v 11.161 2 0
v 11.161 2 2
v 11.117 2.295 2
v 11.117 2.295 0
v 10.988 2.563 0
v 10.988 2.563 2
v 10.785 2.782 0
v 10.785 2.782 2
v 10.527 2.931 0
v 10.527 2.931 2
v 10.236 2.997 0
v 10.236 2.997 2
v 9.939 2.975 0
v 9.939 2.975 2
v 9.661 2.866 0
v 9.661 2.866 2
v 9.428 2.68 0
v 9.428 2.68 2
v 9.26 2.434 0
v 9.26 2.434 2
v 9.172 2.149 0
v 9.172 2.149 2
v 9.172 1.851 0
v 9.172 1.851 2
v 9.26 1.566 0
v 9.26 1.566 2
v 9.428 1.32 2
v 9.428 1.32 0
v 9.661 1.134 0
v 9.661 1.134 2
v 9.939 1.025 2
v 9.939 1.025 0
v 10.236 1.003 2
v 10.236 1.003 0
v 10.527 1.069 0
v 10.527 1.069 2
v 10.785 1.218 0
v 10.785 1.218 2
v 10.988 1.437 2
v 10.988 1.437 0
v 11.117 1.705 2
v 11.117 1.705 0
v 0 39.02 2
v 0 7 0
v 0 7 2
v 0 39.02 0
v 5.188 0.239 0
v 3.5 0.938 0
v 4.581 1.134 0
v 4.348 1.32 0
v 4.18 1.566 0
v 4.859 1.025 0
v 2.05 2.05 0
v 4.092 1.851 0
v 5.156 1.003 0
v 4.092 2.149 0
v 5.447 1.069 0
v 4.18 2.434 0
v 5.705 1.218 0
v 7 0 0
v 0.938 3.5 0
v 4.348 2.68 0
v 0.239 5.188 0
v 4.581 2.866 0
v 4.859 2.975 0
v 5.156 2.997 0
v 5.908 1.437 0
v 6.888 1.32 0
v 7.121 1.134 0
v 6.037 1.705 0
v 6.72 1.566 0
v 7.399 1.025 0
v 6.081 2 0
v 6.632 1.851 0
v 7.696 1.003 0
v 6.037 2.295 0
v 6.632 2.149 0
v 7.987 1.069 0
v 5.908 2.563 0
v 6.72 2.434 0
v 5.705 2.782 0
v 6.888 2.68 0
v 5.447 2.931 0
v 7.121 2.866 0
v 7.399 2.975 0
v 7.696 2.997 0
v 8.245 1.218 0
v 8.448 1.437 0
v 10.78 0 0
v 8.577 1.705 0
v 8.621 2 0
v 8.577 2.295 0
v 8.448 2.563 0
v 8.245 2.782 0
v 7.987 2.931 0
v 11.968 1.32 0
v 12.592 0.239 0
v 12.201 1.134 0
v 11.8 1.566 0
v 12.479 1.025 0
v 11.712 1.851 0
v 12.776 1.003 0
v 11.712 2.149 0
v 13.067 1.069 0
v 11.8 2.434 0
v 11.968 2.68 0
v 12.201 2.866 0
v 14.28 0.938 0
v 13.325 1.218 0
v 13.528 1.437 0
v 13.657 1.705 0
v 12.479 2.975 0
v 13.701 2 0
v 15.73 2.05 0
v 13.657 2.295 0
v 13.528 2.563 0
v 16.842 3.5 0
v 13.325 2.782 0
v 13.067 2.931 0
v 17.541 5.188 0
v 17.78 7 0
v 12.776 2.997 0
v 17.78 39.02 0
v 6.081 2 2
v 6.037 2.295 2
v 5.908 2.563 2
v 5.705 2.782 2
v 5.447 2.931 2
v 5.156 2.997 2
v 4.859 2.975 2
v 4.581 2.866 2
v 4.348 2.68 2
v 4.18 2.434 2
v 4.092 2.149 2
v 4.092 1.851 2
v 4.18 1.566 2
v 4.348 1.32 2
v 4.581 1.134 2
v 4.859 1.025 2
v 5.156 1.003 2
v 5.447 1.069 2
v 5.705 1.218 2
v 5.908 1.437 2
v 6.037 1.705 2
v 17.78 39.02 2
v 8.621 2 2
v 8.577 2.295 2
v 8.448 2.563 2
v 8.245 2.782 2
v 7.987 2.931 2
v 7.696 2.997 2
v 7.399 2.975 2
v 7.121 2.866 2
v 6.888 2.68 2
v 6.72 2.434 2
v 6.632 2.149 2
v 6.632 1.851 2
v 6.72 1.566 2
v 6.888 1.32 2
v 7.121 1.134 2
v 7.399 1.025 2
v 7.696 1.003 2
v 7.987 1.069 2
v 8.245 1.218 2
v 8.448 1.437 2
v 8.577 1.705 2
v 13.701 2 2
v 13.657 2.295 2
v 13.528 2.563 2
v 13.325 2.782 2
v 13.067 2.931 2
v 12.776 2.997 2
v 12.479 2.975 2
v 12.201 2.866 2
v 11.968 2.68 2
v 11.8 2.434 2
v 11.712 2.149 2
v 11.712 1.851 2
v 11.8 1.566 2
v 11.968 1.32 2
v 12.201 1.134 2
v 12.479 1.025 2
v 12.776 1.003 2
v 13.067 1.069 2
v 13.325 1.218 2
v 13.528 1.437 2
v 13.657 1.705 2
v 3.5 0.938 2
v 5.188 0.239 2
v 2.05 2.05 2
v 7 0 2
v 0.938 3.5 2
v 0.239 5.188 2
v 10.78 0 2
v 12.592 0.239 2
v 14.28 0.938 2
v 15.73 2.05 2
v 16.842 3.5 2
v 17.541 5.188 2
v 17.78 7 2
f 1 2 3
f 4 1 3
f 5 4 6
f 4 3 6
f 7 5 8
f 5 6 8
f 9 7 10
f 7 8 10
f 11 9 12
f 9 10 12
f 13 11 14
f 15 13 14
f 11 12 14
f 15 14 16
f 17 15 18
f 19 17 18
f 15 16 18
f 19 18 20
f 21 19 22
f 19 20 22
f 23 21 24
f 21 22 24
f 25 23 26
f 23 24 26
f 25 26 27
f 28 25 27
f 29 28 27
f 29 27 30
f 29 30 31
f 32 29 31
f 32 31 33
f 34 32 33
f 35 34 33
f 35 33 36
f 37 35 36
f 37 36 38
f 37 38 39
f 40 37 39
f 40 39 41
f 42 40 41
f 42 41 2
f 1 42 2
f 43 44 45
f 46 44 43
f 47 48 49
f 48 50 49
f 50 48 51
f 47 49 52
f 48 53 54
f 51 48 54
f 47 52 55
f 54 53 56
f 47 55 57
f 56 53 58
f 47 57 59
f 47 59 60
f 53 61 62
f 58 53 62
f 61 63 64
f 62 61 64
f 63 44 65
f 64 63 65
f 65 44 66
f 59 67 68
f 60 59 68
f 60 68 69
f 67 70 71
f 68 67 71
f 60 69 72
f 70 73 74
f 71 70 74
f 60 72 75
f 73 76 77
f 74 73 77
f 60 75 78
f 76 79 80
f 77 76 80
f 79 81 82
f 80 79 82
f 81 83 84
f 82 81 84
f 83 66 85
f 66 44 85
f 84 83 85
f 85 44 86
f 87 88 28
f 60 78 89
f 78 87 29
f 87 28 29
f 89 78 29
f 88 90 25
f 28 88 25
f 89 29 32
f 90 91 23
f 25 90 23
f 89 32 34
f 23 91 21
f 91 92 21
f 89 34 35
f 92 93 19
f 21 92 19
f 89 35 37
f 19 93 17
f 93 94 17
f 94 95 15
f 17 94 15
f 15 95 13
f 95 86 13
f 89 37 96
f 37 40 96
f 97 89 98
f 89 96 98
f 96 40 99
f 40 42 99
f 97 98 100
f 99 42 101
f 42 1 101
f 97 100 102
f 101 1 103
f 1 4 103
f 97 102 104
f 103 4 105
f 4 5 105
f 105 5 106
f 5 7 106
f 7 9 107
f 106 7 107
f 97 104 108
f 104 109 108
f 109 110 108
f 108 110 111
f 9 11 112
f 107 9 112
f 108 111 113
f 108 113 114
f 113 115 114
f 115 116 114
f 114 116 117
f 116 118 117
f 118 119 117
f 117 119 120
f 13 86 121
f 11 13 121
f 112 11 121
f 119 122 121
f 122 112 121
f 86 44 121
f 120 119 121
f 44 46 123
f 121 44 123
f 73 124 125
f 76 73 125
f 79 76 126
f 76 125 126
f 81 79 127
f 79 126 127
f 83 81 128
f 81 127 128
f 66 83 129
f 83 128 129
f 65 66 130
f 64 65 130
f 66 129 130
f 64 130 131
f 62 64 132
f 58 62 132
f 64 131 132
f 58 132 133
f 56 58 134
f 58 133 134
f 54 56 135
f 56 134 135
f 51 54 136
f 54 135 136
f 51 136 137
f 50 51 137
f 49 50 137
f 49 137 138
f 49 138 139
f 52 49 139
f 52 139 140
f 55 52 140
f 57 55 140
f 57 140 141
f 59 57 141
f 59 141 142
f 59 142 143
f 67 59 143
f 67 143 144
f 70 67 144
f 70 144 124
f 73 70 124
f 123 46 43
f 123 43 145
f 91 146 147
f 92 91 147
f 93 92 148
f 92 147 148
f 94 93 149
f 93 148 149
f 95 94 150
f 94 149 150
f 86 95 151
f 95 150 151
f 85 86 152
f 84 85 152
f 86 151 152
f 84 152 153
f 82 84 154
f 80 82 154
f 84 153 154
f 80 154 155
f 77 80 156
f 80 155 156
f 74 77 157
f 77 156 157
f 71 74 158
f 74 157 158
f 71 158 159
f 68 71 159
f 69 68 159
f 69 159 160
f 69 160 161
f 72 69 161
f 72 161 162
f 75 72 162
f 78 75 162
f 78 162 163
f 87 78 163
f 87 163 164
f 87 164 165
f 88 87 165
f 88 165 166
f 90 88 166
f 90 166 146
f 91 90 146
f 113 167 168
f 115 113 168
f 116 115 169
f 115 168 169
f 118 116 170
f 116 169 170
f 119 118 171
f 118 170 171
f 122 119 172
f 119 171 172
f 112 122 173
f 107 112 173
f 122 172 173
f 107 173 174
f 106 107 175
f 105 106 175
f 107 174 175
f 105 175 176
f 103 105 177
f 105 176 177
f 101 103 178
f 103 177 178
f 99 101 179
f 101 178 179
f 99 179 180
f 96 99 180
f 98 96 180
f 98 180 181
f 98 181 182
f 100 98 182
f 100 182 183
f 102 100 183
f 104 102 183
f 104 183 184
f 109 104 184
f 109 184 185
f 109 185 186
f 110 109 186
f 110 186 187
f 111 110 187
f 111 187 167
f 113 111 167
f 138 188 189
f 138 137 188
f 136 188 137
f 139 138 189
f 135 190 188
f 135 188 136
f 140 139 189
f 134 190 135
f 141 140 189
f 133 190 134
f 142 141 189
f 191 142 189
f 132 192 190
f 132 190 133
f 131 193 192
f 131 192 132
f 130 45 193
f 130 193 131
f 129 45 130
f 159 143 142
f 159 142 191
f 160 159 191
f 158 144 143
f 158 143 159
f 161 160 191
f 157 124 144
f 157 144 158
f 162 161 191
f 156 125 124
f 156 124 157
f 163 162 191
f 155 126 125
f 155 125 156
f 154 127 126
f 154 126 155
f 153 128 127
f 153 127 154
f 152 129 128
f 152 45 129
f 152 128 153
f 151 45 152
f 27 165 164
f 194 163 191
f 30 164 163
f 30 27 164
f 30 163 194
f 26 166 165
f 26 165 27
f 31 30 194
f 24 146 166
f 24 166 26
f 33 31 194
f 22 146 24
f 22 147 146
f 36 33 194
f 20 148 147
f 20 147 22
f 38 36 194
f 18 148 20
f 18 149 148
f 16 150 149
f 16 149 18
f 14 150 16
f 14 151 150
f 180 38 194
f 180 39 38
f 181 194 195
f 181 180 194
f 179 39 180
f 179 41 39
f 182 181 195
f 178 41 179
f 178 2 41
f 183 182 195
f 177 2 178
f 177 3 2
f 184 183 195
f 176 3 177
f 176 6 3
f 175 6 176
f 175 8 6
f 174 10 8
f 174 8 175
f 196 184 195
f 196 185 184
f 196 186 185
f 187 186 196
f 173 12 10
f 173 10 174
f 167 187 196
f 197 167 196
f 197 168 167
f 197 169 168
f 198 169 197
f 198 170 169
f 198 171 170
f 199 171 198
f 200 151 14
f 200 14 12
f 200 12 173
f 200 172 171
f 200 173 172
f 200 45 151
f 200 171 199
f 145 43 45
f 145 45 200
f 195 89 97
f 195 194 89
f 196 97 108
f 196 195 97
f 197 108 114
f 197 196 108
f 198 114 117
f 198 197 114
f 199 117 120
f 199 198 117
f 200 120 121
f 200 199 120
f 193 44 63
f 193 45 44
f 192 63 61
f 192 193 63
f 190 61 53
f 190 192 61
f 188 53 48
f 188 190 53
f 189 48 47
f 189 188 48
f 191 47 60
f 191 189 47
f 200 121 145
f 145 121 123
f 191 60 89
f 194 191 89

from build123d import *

# Parameters (mm, degrees)
SKETCH1_W           = 17.78
SKETCH1_H           = 39.02
BOSS_EXTRUDE1_DEPTH = 2
SKETCH2_R           = 1
CUT_EXTRUDE5_DEPTH  = 10
FILLET4_R           = 7


with BuildPart() as part:
    # Sketch1 → Boss-Extrude1 (new body)
    with BuildSketch(Plane.XY):
        with Locations((8.89, 19.51)):
            Rectangle(SKETCH1_W, SKETCH1_H)
    extrude(amount=BOSS_EXTRUDE1_DEPTH)

    # Sketch2 → Cut-Extrude5 (cut)
    with BuildSketch(Plane.XY.offset(2)):
        with Locations((5.081291963, 2)):
            Circle(SKETCH2_R)
        with Locations((7.621291963, 2)):
            Circle(SKETCH2_R)
        with Locations((10.161291963, 2)):
            Circle(SKETCH2_R)
        with Locations((12.701291963, 2)):
            Circle(SKETCH2_R)
    extrude(amount=-CUT_EXTRUDE5_DEPTH, mode=Mode.SUBTRACT)

    # Fillet4
    fillet4_edges = [part.edges().sort_by_distance(p)[0] for p in [
        (17.78, 0, 1),
        (0, 0, 1),
    ]]
    fillet(fillet4_edges, radius=FILLET4_R)


solid = part.part
